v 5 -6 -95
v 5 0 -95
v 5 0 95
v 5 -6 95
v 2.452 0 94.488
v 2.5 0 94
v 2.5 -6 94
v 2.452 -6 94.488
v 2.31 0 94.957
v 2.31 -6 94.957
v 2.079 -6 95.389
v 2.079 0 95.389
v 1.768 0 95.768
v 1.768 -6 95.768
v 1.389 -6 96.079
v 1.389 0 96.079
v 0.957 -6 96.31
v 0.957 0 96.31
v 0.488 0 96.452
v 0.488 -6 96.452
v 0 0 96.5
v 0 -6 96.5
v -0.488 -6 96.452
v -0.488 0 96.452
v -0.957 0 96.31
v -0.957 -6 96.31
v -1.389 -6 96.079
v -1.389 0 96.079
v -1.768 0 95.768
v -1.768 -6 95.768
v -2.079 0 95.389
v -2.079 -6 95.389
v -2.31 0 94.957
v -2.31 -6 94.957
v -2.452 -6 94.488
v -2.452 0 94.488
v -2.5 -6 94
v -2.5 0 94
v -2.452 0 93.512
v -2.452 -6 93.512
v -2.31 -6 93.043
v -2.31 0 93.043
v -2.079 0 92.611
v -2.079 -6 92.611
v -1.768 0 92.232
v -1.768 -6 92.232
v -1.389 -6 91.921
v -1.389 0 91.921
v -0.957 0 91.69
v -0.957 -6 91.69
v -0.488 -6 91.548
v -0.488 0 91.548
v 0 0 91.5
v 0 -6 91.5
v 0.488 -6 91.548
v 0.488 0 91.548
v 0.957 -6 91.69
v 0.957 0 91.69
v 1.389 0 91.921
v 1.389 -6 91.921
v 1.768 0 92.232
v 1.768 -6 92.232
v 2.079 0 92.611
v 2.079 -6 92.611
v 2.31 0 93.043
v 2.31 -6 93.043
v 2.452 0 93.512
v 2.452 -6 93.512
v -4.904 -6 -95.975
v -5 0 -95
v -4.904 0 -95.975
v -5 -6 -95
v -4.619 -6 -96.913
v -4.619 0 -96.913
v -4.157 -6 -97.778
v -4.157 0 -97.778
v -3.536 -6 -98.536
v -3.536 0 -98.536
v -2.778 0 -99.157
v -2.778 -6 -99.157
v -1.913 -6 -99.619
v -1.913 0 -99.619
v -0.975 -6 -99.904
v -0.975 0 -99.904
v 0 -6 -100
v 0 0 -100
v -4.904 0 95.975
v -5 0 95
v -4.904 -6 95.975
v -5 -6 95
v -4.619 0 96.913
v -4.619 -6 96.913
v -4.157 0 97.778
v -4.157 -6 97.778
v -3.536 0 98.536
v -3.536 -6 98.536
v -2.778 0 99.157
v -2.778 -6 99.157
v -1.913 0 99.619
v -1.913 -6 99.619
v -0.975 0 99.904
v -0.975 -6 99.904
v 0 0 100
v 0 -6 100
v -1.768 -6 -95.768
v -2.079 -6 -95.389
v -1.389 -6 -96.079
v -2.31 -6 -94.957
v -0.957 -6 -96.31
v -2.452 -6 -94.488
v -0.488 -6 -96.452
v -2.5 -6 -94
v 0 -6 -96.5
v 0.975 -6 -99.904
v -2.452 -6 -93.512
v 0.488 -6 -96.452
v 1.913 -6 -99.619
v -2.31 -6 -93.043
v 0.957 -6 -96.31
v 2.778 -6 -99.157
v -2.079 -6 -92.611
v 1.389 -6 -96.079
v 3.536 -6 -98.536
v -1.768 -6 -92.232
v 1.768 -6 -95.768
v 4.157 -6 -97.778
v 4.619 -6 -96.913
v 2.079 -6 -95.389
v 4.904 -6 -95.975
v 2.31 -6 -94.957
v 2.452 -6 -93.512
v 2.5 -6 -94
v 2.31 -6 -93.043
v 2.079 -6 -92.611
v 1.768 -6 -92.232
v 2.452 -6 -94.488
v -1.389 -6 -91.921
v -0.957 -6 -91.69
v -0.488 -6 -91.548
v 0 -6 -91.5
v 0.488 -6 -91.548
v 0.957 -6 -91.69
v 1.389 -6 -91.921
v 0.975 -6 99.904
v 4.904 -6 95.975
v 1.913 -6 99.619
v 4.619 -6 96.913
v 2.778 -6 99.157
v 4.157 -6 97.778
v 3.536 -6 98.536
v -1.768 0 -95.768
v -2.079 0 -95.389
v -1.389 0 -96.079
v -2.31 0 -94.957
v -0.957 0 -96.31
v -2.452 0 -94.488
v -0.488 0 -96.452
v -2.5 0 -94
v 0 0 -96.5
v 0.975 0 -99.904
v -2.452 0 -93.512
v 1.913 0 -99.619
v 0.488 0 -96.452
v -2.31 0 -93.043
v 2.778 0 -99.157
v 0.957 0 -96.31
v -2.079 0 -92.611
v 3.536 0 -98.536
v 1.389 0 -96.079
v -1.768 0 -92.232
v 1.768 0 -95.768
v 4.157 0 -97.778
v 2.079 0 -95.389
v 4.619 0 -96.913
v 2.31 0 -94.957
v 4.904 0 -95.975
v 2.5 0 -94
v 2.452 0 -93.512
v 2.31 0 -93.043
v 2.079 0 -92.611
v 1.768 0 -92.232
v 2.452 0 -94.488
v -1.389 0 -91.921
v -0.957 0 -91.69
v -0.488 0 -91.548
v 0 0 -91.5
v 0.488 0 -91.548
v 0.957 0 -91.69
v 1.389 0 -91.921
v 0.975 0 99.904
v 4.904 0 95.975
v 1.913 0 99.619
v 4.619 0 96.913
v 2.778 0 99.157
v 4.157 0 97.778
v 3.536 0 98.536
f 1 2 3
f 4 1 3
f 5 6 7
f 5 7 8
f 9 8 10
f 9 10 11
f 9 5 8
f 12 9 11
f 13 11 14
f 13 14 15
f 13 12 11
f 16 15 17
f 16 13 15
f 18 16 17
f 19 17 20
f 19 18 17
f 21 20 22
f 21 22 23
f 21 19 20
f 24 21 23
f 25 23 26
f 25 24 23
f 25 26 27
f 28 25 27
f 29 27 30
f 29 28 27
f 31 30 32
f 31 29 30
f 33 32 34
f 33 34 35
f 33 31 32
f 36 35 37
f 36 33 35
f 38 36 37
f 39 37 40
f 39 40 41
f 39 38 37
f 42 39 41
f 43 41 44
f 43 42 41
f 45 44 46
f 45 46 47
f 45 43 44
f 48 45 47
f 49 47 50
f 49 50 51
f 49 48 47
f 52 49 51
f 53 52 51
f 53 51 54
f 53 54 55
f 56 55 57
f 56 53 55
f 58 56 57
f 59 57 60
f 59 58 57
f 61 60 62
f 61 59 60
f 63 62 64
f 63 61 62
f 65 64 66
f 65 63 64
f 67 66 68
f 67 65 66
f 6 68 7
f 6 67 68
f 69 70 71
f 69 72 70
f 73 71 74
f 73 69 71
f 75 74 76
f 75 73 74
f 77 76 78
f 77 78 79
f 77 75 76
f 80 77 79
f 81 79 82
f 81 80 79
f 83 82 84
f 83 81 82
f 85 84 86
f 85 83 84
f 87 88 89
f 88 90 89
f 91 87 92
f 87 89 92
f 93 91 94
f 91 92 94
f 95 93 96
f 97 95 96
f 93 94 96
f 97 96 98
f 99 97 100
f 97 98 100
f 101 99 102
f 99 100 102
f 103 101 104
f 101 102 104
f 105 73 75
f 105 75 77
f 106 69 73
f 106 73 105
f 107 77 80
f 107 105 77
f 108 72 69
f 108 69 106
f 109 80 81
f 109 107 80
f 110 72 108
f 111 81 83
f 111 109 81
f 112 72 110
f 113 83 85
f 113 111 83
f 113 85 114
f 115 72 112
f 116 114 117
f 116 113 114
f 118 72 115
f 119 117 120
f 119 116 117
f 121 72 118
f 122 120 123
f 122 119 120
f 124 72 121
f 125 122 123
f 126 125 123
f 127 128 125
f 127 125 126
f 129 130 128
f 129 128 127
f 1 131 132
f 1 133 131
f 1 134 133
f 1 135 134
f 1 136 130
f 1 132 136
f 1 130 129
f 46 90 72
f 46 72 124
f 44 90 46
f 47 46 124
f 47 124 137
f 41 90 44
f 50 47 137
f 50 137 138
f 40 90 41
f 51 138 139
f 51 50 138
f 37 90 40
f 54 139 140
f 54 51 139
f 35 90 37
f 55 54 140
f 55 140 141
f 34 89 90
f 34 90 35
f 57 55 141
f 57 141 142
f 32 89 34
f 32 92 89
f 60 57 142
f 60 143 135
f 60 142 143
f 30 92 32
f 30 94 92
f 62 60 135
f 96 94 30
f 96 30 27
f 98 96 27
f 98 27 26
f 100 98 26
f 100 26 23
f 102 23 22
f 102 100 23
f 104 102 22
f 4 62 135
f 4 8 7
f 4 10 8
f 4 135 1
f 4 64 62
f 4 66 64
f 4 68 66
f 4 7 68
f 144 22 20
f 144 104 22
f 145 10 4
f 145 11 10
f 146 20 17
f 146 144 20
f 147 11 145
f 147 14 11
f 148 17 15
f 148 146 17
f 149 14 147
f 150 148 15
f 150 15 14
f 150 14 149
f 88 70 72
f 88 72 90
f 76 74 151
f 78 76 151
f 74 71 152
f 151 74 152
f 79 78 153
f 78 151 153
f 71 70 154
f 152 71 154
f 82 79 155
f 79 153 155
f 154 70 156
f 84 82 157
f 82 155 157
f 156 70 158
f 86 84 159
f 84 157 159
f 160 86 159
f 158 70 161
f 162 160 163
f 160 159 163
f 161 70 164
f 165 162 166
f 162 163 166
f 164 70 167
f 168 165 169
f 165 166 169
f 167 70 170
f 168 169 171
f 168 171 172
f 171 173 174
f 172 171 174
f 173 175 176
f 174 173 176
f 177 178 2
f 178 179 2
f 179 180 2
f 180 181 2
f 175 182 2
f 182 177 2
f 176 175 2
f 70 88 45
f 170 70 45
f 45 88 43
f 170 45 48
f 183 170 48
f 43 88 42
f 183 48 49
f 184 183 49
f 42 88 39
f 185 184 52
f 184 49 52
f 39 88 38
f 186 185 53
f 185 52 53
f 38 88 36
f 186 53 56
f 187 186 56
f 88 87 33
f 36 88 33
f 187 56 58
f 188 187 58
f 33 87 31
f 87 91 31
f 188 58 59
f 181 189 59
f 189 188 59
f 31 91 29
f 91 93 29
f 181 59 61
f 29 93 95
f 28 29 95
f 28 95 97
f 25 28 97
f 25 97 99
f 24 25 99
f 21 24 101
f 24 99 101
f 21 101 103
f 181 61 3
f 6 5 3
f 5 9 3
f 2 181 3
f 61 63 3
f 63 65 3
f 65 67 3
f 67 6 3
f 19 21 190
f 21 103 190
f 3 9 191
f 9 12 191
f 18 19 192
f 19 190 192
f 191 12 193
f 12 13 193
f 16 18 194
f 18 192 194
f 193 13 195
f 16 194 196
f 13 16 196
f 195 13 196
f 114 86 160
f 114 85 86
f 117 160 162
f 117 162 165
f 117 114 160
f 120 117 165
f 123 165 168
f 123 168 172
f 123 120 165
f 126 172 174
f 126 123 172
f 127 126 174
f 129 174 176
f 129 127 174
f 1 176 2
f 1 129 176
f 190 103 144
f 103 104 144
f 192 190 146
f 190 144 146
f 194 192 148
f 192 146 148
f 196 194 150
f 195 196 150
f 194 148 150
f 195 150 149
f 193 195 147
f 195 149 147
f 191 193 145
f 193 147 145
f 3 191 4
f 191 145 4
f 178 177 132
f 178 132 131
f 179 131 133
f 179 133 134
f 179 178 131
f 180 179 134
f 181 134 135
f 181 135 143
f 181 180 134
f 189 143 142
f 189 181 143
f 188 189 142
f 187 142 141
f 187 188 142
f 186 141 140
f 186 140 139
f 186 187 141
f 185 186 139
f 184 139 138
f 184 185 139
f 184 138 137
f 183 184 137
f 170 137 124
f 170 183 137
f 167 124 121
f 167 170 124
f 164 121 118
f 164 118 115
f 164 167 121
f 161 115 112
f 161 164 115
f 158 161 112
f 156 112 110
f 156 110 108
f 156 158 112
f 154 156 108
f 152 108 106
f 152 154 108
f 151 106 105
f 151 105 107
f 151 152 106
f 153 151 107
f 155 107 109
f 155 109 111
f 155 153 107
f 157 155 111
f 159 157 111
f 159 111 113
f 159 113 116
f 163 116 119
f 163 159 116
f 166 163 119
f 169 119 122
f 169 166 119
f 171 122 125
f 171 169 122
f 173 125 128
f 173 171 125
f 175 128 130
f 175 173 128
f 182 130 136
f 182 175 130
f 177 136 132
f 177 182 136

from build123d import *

# Parameters (mm, degrees)
F0_W     = 10
F0_H     = 200
F0_R     = 2.5
F1_DEPTH = 6
F2_R     = 4.99999


# Not quite as in the source:
# - a fillet or chamfer is up to 0.001 mm smaller than in the source, because OpenCascade refuses the exact size


with BuildPart() as f1:
    # F0 (on Front) → F1 (new body)
    with BuildSketch(Plane.XZ):
        Rectangle(F0_W, F0_H)
        with Locations((0, -94)):
            Circle(F0_R, mode=Mode.SUBTRACT)
        with Locations((0, 94)):
            Circle(F0_R, mode=Mode.SUBTRACT)
    extrude(amount=F1_DEPTH)

    # F2 (radius 5 in the source; OpenCascade refuses exactly that, so slightly less here)
    f2_edges = [f1.edges().sort_by_distance(p)[0] for p in [
        (-5, -3, 100),
        (5, -3, 100),
        (5, -3, -100),
        (-5, -3, -100),
    ]]
    fillet(f2_edges, radius=F2_R)


solid = f1.part
